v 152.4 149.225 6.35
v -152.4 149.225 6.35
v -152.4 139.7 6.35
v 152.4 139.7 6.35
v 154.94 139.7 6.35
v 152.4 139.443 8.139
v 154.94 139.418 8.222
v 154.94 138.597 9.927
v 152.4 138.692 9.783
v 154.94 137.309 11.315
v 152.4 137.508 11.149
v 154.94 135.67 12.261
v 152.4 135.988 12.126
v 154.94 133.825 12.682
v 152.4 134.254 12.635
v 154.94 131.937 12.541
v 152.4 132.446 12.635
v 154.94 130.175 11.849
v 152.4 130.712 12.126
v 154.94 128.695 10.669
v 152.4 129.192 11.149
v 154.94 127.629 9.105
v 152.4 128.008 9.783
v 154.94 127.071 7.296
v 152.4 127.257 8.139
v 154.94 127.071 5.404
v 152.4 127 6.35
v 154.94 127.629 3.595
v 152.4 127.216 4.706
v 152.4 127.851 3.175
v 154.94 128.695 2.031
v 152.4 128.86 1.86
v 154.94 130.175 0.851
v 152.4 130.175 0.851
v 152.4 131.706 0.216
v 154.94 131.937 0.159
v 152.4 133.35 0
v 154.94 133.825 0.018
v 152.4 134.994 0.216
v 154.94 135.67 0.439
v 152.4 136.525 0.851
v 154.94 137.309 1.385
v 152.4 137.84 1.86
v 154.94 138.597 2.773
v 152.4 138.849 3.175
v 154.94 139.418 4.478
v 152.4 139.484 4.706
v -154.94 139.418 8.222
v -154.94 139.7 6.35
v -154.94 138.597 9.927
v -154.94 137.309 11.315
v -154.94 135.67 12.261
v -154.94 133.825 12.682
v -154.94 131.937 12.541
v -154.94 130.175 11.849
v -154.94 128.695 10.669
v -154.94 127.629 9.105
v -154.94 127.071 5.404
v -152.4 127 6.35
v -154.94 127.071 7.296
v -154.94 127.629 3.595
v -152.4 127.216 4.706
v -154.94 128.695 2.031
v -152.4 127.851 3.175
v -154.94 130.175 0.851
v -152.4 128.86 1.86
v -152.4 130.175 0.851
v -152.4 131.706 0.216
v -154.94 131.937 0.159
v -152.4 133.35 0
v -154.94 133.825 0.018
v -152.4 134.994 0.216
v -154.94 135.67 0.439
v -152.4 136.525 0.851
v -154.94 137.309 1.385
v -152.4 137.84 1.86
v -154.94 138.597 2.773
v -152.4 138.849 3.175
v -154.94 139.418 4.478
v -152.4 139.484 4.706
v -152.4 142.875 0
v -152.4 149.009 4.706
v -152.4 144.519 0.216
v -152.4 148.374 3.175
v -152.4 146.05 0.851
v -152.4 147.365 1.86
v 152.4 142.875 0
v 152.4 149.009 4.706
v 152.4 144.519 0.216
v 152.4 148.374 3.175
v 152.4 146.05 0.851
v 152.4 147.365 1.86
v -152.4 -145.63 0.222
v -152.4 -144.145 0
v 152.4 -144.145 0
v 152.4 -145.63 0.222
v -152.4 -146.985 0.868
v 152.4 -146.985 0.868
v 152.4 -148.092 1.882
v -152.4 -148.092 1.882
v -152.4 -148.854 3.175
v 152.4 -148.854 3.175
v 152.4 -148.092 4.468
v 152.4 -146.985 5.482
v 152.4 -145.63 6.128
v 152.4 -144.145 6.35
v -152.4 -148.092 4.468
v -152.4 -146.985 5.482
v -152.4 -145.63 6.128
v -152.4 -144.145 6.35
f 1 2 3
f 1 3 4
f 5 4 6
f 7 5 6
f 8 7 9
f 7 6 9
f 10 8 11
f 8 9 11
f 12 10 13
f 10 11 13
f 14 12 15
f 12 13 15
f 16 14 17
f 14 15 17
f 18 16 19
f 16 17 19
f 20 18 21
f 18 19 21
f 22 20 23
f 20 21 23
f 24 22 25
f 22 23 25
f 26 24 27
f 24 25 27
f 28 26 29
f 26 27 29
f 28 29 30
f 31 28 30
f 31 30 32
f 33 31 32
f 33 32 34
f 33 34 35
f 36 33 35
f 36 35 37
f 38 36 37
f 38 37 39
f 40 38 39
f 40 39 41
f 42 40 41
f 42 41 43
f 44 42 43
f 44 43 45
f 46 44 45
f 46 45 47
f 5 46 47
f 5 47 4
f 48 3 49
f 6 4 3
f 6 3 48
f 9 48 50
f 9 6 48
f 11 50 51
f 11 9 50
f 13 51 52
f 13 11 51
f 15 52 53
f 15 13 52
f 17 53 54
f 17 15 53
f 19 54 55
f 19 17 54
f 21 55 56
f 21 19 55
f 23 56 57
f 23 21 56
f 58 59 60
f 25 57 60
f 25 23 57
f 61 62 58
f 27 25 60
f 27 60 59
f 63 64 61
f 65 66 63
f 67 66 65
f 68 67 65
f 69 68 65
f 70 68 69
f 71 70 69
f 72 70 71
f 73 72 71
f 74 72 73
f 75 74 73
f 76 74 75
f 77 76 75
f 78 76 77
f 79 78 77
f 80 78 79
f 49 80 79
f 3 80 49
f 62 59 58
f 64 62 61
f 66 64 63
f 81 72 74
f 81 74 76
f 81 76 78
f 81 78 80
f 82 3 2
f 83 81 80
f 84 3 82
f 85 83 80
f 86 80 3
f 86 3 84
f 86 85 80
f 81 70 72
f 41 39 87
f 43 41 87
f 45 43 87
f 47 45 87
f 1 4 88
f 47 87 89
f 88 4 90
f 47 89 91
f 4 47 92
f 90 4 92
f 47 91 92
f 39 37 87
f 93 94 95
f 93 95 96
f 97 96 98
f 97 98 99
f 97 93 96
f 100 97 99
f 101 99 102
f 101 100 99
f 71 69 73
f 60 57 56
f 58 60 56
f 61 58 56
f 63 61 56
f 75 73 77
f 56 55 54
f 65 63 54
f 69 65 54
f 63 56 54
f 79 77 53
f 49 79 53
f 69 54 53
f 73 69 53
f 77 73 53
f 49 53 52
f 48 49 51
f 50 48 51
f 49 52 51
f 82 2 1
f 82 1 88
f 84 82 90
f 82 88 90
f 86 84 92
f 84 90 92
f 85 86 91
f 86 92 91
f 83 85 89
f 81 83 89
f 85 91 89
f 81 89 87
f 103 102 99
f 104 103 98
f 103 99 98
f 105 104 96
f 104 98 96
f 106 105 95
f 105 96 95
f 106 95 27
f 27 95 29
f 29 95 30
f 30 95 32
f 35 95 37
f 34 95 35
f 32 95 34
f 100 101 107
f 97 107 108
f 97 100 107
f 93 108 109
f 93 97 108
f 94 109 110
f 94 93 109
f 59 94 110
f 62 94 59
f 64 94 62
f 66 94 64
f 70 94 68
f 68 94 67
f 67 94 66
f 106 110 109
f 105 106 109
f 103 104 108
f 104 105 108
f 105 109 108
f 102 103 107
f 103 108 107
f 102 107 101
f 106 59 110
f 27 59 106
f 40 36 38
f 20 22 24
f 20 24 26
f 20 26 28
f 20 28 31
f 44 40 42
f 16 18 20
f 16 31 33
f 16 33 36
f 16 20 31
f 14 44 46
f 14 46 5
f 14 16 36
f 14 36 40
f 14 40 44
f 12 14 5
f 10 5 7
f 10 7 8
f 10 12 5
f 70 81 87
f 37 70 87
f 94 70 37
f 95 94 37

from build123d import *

# Parameters (mm, degrees)
F0_W          = 304.8
F0_H          = 298.45
F1_DEPTH      = 6.35
F2_R          = 6.34999
F3_R          = 6.35
F4_DEPTH      = 2.54
F4_DEPTH_BACK = 307.34
F5_T1_DEPTH   = 330.2


# Not quite as in the source:
# - a fillet or chamfer that OpenCascade refuses, or shapes differently, is made with other operations: its cross-section is extruded or revolved along the edge and cut away or added
# - a fillet or chamfer is up to 0.001 mm smaller than in the source, because OpenCascade refuses the exact size


with BuildPart() as f1:
    # F0 (on Top) → F1 (new body)
    with BuildSketch(Plane.XY):
        Rectangle(F0_W, F0_H)
    extrude(amount=F1_DEPTH)

    # F2 (radius 6.35 in the source; OpenCascade refuses exactly that, so slightly less here)
    f2_edges = [f1.edges().sort_by_distance(p)[0] for p in [
        (0, 149.225, 0),
    ]]
    fillet(f2_edges, radius=F2_R)

    # F3 (on face) → F4 (join, two sides)
    with BuildSketch(Plane.YZ.offset(152.4)) as f4_sk:
        with Locations((133.35, 6.35)):
            Circle(F3_R)
    extrude(amount=F4_DEPTH)
    extrude(f4_sk.sketch, amount=-F4_DEPTH_BACK)

    # F5: fillet of radius 5.08 on 2 edges, made by hand

    # F5_s2 → F5_t1 (cut)
    with BuildSketch(Plane.YZ.offset(-165.1)):
        with BuildLine():
            ThreePointArc((-144.145, 0), (-147.7371024484, 1.4878975516), (-149.225, 5.08))
            Line((-149.225, 5.08), (-149.225, 0))
            Line((-149.225, 0), (-144.145, 0))
        make_face()
        with BuildLine():
            ThreePointArc((-144.145, 6.35), (-147.7371024484, 4.8621024484), (-149.225, 1.27))
            Line((-149.225, 1.27), (-149.225, 6.35))
            Line((-149.225, 6.35), (-144.145, 6.35))
        make_face()
    extrude(amount=F5_T1_DEPTH, mode=Mode.SUBTRACT)


solid = f1.part
